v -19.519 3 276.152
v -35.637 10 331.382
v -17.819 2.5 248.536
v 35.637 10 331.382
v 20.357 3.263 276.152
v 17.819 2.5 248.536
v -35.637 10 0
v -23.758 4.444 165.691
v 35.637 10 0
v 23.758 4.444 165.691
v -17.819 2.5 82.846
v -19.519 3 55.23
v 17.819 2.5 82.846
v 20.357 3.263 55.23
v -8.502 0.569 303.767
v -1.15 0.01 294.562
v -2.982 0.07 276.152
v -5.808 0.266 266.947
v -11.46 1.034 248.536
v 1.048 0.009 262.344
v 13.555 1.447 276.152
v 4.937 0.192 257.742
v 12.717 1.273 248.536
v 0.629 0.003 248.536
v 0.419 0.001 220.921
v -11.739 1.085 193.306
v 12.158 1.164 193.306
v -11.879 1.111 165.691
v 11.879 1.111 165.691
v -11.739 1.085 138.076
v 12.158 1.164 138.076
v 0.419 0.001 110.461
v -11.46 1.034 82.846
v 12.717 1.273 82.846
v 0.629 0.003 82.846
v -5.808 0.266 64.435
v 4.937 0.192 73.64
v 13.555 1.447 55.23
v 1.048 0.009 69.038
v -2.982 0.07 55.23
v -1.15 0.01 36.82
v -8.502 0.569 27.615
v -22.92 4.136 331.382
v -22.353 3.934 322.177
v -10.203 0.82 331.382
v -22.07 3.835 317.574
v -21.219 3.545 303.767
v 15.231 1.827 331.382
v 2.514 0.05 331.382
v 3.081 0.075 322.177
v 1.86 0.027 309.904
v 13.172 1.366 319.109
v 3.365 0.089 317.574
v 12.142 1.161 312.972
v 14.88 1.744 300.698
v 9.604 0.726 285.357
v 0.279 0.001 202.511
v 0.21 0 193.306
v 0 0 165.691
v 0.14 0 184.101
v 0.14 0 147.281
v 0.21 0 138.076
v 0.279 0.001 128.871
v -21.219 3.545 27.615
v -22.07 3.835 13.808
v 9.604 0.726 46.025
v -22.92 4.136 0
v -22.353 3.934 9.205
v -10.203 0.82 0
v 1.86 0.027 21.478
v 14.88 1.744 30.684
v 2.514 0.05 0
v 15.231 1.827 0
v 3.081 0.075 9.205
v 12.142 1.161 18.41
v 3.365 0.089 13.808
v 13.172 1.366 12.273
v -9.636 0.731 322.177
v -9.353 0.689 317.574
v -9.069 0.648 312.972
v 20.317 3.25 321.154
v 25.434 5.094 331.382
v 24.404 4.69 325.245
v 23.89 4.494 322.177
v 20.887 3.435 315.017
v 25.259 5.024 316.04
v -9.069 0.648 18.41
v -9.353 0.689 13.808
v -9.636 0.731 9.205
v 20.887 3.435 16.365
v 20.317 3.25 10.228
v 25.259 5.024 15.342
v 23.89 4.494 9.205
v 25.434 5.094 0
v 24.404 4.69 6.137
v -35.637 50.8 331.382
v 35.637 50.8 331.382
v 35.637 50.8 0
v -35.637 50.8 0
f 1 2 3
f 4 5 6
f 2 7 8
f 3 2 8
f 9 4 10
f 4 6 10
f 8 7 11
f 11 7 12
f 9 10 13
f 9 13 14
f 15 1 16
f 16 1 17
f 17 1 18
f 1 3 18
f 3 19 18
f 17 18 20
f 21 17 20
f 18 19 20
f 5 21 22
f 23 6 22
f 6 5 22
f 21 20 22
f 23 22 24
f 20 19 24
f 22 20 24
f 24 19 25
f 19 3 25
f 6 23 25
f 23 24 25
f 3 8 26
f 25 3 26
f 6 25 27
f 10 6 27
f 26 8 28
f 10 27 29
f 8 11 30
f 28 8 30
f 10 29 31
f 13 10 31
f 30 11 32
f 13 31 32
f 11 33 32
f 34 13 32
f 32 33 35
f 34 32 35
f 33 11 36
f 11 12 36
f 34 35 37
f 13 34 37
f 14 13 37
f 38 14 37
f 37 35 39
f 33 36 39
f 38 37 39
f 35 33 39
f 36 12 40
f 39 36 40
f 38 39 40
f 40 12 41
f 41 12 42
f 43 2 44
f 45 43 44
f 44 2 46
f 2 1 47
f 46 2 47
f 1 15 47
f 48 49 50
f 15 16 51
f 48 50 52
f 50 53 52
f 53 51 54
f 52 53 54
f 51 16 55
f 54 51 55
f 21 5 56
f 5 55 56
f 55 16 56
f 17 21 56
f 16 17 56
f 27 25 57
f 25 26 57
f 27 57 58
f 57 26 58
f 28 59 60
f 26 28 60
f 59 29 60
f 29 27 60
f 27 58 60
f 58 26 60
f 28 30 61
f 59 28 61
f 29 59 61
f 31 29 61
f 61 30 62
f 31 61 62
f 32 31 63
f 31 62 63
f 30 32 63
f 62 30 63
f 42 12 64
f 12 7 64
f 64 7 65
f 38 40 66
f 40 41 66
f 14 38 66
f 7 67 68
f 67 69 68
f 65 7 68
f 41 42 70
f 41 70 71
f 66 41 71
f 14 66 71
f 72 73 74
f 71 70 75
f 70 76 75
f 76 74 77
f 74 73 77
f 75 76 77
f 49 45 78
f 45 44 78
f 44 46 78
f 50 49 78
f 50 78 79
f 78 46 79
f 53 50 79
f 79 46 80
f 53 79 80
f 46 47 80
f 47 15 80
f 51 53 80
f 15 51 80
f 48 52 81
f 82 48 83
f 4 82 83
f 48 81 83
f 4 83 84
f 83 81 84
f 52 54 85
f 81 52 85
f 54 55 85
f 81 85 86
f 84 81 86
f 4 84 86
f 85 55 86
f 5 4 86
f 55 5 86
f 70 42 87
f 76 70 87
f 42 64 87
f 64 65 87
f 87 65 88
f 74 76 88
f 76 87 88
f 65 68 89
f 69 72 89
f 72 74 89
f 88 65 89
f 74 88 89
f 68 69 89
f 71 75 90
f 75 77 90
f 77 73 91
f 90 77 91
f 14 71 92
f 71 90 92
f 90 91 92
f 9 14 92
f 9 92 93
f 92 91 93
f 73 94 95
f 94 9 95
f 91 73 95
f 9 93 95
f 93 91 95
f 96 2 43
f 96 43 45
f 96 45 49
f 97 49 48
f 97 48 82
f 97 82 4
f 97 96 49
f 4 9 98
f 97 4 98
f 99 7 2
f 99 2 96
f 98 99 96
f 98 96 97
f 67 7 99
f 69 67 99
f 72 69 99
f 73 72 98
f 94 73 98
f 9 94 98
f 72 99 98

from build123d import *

# Parameters (mm, degrees)
BOSS_EXTRUDE2_DEPTH = 331.382
SKETCH5_W           = 260
SKETCH5_H           = 120
CUT_EXTRUDE4_DEPTH  = 332.3820001
SKETCH6_W           = 71.274118724
SKETCH6_H           = 40.8
BOSS_EXTRUDE3_DEPTH = 331.382


with BuildPart() as part:
    # Sketch2 → Boss-Extrude2 (new body)
    with BuildSketch(Plane.XY):
        with BuildLine():
            Line((-127, 127), (127, 127))
            add(Edge.make_bspline(
                [(-127, 127), (0, -127), (127, 127)],
                knots=[0.056028396, 0.056028396, 0.056028396, 0.943971604, 0.943971604, 0.943971604], degree=2))
        make_face()
    extrude(amount=BOSS_EXTRUDE2_DEPTH)

    # Sketch5 → Cut-Extrude4 (cut, through all)
    with BuildSketch(Plane.XY.offset(331.382)):
        with Locations((0, 70)):
            Rectangle(SKETCH5_W, SKETCH5_H)
    extrude(amount=-CUT_EXTRUDE4_DEPTH, mode=Mode.SUBTRACT)

    # Sketch6 → Boss-Extrude3 (add)
    with BuildSketch(Plane.XY.offset(331.382)):
        with Locations((0, 30.4)):
            Rectangle(SKETCH6_W, SKETCH6_H)
    extrude(amount=-BOSS_EXTRUDE3_DEPTH)


solid = part.part
